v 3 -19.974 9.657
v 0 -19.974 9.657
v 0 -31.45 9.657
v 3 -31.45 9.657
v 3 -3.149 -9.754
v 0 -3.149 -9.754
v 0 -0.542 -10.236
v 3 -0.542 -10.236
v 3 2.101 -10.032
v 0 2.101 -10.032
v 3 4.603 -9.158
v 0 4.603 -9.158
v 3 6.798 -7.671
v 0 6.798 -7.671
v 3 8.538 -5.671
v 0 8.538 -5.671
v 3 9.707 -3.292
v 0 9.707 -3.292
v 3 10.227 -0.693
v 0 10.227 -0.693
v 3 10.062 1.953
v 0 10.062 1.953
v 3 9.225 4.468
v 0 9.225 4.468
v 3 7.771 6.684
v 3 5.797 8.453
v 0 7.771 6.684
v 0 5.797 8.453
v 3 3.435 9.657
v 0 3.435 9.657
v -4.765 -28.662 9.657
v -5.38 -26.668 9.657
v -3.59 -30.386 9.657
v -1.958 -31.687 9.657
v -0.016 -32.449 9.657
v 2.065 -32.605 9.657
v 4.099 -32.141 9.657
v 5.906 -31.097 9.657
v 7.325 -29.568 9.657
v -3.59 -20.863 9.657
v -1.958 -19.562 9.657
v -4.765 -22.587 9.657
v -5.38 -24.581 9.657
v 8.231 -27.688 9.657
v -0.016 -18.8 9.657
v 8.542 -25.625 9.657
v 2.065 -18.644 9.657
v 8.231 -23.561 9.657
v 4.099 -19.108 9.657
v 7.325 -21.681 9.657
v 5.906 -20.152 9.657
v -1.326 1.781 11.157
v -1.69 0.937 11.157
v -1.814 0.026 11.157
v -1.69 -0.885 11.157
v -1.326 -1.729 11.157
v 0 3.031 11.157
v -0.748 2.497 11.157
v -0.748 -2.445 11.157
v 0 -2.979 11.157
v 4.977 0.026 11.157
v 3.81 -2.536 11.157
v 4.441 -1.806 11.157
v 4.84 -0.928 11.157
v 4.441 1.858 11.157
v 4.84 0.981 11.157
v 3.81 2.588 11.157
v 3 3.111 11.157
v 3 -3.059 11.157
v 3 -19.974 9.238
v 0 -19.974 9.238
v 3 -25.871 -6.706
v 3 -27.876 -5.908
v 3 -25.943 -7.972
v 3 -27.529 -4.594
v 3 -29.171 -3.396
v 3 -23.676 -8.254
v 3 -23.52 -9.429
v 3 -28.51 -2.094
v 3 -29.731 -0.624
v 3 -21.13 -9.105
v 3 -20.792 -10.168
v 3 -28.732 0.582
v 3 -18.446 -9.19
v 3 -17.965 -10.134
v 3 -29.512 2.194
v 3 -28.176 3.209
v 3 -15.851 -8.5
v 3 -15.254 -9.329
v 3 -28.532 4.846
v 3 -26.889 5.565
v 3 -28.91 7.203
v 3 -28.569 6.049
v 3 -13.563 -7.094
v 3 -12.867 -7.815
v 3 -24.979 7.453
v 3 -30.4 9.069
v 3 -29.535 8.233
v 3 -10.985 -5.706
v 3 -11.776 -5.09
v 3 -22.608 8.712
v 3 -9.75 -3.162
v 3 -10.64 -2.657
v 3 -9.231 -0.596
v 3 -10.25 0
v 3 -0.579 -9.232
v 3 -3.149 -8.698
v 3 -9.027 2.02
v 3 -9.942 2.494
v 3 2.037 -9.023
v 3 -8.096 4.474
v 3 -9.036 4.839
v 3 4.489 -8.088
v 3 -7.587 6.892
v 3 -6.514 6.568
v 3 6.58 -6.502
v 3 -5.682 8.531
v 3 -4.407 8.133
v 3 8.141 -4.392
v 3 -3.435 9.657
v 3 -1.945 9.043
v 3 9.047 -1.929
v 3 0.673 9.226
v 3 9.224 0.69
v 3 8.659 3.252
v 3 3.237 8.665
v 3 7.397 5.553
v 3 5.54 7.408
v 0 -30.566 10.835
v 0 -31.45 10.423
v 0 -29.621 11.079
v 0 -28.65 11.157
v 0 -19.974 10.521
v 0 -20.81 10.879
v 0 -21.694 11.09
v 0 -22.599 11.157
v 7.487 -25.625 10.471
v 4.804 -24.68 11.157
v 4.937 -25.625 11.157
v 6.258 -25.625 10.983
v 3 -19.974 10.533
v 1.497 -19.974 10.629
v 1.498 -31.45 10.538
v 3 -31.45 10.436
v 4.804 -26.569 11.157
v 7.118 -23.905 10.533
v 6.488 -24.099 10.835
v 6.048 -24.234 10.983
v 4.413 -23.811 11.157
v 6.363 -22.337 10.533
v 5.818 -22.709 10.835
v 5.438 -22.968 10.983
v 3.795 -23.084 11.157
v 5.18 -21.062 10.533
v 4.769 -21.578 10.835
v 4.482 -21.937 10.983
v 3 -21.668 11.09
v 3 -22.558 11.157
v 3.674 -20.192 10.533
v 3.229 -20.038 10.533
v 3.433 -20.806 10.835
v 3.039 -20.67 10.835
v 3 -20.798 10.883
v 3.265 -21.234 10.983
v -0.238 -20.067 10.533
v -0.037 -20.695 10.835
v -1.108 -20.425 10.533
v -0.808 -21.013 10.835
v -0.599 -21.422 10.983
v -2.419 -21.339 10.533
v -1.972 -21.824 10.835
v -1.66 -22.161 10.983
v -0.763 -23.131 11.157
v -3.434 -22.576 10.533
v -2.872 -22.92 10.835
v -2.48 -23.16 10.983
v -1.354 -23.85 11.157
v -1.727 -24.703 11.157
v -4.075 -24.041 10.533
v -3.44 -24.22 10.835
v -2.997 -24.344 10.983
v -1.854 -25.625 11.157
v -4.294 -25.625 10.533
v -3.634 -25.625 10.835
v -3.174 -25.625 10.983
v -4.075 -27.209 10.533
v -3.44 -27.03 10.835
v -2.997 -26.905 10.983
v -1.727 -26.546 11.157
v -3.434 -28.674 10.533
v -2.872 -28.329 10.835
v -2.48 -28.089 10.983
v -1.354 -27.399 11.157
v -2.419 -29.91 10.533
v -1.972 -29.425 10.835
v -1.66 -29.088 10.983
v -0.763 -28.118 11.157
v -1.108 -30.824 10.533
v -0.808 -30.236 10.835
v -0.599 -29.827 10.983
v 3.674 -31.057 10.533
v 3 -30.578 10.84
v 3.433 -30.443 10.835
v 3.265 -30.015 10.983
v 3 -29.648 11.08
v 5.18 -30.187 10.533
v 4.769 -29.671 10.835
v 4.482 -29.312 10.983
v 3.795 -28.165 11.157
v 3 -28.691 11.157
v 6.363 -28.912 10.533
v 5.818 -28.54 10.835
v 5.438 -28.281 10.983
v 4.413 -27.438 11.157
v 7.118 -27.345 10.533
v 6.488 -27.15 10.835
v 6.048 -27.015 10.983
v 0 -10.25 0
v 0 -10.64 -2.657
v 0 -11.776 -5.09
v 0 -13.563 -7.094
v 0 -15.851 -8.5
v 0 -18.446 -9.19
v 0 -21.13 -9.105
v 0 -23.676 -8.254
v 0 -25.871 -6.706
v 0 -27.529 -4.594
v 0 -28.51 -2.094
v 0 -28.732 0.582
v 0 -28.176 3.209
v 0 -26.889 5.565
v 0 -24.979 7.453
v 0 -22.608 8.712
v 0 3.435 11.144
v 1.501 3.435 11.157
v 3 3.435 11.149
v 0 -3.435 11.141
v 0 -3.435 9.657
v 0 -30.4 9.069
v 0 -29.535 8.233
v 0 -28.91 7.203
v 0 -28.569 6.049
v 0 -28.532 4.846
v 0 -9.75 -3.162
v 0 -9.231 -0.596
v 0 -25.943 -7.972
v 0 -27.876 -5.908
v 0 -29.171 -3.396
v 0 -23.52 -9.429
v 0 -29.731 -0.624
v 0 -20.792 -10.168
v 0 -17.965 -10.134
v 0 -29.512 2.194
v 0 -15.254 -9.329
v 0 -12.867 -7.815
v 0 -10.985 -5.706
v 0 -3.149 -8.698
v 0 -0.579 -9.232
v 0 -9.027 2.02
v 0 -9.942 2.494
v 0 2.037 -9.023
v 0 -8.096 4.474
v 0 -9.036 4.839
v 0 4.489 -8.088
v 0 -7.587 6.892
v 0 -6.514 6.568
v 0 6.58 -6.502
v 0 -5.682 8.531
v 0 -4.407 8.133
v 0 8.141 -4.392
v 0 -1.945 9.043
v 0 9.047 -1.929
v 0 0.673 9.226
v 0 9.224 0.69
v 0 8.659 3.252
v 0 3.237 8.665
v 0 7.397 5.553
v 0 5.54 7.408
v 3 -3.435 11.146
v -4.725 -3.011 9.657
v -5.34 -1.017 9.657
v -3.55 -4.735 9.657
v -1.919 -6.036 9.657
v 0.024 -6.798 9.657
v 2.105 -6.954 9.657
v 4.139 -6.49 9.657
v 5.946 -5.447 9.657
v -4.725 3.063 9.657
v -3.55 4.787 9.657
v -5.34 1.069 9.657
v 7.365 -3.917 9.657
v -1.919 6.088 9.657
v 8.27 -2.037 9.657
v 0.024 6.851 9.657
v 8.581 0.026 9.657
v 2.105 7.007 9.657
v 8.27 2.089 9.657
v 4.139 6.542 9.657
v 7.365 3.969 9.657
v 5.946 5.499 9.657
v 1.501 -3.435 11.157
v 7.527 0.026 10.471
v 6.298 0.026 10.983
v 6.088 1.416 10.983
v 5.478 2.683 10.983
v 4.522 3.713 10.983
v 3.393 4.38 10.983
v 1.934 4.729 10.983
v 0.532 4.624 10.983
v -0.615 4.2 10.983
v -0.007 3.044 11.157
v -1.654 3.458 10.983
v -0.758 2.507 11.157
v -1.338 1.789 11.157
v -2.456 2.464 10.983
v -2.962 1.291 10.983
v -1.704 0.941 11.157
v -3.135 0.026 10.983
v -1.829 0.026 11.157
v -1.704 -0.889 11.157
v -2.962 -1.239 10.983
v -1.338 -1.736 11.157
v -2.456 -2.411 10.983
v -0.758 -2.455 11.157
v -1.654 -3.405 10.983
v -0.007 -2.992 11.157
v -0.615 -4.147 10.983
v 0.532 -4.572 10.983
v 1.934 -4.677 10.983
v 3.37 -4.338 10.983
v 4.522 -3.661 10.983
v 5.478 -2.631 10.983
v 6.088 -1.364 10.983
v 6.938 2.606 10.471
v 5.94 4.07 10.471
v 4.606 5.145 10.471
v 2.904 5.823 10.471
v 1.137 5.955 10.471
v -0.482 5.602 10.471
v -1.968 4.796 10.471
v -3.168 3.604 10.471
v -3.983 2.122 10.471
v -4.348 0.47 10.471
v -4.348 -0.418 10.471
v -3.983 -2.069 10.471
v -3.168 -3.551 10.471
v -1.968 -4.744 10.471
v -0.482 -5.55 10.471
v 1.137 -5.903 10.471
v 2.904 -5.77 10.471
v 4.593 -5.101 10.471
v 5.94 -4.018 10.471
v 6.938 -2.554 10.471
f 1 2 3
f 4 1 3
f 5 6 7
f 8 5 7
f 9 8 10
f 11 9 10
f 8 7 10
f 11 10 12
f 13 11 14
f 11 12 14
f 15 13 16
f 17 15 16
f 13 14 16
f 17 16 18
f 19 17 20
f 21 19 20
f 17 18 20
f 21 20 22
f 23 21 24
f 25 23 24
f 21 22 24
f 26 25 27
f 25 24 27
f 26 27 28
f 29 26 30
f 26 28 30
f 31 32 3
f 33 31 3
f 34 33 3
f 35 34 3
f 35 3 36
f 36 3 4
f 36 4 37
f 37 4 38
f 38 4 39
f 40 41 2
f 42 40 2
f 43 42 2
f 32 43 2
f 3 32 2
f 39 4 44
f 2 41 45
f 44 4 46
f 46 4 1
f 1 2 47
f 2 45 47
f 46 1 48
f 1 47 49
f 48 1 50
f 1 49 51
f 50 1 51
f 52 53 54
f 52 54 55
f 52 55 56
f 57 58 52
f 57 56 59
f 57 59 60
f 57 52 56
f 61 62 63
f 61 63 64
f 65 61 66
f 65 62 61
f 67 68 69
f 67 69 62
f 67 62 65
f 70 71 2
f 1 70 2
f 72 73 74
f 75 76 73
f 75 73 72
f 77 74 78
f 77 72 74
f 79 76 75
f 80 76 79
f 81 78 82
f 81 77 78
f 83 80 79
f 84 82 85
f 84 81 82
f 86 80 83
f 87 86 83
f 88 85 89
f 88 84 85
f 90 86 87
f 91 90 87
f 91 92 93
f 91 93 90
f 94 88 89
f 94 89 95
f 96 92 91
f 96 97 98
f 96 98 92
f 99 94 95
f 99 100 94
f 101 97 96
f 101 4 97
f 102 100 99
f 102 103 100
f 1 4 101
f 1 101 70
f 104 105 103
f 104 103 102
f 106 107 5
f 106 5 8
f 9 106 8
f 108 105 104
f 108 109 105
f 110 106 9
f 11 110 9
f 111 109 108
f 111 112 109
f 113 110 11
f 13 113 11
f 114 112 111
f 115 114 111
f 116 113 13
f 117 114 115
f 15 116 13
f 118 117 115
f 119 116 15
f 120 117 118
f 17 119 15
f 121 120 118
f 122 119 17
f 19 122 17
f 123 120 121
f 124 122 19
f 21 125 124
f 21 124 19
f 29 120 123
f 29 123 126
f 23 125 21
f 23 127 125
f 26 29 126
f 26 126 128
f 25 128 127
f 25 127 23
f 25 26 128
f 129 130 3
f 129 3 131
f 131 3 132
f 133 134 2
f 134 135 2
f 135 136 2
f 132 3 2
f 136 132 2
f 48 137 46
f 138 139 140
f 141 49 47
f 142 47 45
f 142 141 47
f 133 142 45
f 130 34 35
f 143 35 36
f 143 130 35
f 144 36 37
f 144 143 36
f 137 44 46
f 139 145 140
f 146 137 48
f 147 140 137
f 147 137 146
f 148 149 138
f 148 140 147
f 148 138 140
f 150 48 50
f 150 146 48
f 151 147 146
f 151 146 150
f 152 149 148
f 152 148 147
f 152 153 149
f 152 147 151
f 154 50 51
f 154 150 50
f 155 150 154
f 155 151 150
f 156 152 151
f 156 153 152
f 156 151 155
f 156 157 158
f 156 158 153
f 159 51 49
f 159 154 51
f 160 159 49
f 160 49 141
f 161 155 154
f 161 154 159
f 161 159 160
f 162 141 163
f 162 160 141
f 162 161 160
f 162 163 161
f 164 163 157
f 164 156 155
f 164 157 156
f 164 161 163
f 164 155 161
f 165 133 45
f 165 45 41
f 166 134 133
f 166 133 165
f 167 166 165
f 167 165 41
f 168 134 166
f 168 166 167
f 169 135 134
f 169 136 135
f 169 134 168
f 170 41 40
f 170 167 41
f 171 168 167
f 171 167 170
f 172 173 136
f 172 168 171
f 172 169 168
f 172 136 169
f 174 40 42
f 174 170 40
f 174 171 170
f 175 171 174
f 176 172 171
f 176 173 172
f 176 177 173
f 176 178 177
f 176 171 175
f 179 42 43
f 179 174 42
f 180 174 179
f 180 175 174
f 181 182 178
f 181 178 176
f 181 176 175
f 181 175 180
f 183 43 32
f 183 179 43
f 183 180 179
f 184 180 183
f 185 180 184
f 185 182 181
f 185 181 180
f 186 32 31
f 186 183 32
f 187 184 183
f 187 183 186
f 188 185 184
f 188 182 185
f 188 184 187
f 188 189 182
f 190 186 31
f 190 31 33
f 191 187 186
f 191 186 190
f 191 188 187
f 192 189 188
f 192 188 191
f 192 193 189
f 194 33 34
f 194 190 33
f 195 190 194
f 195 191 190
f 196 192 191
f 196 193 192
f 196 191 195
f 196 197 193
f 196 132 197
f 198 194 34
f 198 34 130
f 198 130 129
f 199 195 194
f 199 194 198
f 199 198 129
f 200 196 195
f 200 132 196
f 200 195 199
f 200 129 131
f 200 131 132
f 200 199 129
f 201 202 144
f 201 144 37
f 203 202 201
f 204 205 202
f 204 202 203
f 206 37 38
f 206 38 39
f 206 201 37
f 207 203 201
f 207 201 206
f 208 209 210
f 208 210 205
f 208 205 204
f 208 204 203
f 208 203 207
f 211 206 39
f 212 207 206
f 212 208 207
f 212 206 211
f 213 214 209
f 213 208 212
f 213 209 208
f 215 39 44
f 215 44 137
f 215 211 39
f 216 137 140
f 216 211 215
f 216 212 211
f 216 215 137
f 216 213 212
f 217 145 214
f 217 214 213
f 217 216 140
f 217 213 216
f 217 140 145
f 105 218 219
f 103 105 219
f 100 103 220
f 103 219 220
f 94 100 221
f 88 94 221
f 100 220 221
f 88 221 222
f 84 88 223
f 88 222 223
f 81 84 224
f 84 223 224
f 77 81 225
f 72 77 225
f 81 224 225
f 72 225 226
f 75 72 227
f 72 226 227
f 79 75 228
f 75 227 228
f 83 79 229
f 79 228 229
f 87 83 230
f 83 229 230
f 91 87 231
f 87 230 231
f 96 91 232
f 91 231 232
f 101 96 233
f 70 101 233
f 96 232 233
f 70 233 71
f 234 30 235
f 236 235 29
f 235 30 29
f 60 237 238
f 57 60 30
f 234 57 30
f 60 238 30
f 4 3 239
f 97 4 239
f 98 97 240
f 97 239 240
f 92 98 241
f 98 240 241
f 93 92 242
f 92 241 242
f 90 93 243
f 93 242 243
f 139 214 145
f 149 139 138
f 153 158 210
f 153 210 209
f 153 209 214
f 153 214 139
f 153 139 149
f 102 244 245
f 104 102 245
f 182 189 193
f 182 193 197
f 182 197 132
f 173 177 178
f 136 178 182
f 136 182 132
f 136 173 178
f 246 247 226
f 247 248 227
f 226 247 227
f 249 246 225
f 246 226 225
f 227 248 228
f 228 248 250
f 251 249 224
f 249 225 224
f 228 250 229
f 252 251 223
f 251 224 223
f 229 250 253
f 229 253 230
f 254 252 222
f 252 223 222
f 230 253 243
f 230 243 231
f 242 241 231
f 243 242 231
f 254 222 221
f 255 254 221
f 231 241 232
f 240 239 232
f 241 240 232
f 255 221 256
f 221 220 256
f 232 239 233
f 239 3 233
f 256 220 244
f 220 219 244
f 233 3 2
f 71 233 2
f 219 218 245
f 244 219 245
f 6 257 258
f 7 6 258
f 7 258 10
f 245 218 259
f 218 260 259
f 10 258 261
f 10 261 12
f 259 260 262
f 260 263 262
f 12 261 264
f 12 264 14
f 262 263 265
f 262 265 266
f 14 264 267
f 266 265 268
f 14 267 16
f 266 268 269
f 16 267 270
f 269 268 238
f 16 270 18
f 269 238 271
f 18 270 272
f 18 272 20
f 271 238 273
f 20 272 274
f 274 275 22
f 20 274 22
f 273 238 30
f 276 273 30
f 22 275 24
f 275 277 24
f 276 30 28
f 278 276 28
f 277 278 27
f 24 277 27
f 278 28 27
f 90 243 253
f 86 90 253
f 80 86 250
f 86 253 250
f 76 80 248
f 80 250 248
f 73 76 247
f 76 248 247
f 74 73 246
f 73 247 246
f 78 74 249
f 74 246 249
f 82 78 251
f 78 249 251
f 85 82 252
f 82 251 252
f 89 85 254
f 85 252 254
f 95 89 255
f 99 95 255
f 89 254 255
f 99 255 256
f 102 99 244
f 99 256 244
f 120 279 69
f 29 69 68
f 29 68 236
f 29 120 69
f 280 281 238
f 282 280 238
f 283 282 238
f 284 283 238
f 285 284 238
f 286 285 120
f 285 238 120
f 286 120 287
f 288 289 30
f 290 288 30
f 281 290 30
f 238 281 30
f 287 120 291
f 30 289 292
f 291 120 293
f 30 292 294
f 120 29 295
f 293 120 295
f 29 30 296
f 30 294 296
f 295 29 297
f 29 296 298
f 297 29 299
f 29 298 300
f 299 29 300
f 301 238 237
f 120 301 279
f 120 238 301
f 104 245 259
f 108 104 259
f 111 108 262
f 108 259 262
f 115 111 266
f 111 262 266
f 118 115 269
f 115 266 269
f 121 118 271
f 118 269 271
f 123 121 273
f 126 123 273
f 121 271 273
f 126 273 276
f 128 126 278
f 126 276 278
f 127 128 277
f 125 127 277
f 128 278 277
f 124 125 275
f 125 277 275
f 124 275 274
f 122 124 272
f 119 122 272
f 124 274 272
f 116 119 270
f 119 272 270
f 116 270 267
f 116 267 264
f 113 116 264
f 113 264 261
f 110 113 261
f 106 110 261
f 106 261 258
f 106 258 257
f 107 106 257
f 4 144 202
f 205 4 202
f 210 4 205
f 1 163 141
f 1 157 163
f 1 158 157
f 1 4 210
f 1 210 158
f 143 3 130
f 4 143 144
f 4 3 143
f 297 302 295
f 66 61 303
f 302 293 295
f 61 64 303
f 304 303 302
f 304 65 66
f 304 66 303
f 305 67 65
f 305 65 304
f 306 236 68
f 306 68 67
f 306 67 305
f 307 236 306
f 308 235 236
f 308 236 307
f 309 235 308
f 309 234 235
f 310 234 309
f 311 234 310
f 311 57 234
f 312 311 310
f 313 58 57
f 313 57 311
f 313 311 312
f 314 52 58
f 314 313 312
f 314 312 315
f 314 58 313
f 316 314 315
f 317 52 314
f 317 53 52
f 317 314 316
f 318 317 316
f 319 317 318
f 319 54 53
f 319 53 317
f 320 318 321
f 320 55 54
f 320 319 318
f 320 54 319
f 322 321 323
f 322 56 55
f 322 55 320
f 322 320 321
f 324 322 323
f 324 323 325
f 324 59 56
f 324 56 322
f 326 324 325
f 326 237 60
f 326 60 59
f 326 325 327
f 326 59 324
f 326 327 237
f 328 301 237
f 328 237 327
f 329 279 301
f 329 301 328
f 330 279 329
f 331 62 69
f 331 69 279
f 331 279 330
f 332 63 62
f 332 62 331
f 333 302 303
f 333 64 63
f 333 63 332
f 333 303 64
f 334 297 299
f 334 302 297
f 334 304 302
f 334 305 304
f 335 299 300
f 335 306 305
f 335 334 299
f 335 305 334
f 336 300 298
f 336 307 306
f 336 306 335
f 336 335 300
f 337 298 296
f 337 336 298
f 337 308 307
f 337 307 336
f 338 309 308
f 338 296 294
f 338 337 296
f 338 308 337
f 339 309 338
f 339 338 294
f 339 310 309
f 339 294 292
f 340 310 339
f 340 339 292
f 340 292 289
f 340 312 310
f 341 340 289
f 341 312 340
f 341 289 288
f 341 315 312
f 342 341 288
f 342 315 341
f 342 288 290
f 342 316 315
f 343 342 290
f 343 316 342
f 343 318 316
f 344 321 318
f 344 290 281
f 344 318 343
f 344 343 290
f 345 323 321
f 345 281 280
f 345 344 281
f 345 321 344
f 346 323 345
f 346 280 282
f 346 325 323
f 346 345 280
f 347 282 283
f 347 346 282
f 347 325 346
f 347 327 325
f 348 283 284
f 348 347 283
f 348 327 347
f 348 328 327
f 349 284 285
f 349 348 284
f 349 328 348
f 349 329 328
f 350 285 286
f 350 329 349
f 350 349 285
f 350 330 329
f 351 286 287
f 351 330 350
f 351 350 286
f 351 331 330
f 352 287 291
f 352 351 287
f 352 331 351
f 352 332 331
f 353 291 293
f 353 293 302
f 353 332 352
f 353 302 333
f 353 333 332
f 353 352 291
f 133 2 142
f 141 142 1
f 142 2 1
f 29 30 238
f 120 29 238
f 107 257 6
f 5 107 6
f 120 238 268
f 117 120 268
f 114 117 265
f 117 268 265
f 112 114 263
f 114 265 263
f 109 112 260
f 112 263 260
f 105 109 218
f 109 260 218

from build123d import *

# Parameters (mm, degrees)
F1_DEPTH = 3
F2_R     = 7
F2_W     = 3
F2_H     = 11.476257816
F3_DEPTH = 1.5
F5_R     = 7
F5_W     = 3
F5_H     = 6.8703614243
F6_DEPTH = 1.5


# Not quite as in the source:
# - a fillet or chamfer that OpenCascade refuses, or shapes differently, is made with other operations: its cross-section is extruded or revolved along the edge and cut away or added


with BuildPart() as f1:
    # F0 (on Right) → F1 (new body)
    with BuildSketch(Plane.YZ):
        with BuildLine():
            ThreePointArc((-9.23076647, -0.5961965923), (7.3973798388, 5.5534918313), (-3.1487550555, -8.697576766))
            Line((-3.1487550555, -8.697576766), (-3.1487550555, -9.7543755105))
            ThreePointArc((-3.1487550555, -9.7543755105), (9.7068577817, -3.2923262302), (3.4351807121, 9.6572270075))
            Line((3.4351807121, 9.6572270075), (-3.4351807121, 9.6572270075))
            ThreePointArc((-3.4351807121, 9.6572270075), (-8.3747567815, 5.9098180048), (-10.25, 0))
            ThreePointArc((-10.25, 0), (-25.8708649083, -6.7063089937), (-19.9742335826, 9.2378353801))
            Line((-19.9742335826, 9.2378353801), (-19.9742335826, 9.6572270075))
            Line((-19.9742335826, 9.6572270075), (-22.9351807121, 9.6572270075))
            Line((-22.9351807121, 9.6572270075), (-31.4504913986, 9.6572270075))
            ThreePointArc((-31.4504913986, 9.6572270075), (-29.1894054573, 7.7380849014), (-28.5320347977, 4.8461167354))
            ThreePointArc((-28.5320347977, 4.8461167354), (-23.5202566717, -9.4286815777), (-9.75, -3.1622776602))
            Line((-9.75, -3.1622776602), (-9.23076647, -0.5961965923))
        make_face()
    extrude(amount=F1_DEPTH)


with BuildPart() as f3:
    # F2 (on face) → F3 (new body)
    with BuildSketch(Plane.XY.offset(9.6572270075)):
        with Locations((1.5416375827, -25.6245899945)):
            Circle(F2_R)
        with Locations((1.5, -25.7123624906)):
            Rectangle(F2_W, F2_H, mode=Mode.SUBTRACT)
    extrude(amount=F3_DEPTH)

    # F4: fillet of radius 5.08 on 1 edges, made by hand

    # F4_s1 → F4_t2 (revolve, cut)
    with BuildSketch(Plane.XZ.offset(25.6245899945)):
        with BuildLine():
            ThreePointArc((8.5416375827, 9.6572270075), (6.8893954541, 10.7672589904), (4.9374733245, 11.1572270075))
            Line((4.9374733245, 11.1572270075), (8.5416375827, 11.1572270075))
            Line((8.5416375827, 11.1572270075), (8.5416375827, 9.6572270075))
        make_face()
    revolve(axis=Axis((1.5416375827, -25.6245899945, 11.1572270075), (0, 0, 1)), mode=Mode.SUBTRACT)


with BuildPart() as f6:
    # F5 (on face) → F6 (new body)
    with BuildSketch(Plane.XY.offset(9.6572270075)):
        with Locations((1.581404591, 0.0261381756)):
            Circle(F5_R)
        with Locations((1.5, 0)):
            Rectangle(F5_W, F5_H, mode=Mode.SUBTRACT)
    extrude(amount=F6_DEPTH)

    # F7: fillet of radius 5.08 on 1 edges, made by hand

    # F7_s1 → F7_t2 (revolve, cut)
    with BuildSketch(Plane.XZ.offset(-0.0261381756)):
        with BuildLine():
            ThreePointArc((8.581404591, 9.6572270075), (6.9291624624, 10.7672589904), (4.9772403328, 11.1572270075))
            Line((4.9772403328, 11.1572270075), (8.581404591, 11.1572270075))
            Line((8.581404591, 11.1572270075), (8.581404591, 9.6572270075))
        make_face()
    revolve(axis=Axis((1.581404591, 0.0261381756, 11.1572270075), (0, 0, 1)), mode=Mode.SUBTRACT)


solid = Compound([f1.part, f3.part, f6.part])
